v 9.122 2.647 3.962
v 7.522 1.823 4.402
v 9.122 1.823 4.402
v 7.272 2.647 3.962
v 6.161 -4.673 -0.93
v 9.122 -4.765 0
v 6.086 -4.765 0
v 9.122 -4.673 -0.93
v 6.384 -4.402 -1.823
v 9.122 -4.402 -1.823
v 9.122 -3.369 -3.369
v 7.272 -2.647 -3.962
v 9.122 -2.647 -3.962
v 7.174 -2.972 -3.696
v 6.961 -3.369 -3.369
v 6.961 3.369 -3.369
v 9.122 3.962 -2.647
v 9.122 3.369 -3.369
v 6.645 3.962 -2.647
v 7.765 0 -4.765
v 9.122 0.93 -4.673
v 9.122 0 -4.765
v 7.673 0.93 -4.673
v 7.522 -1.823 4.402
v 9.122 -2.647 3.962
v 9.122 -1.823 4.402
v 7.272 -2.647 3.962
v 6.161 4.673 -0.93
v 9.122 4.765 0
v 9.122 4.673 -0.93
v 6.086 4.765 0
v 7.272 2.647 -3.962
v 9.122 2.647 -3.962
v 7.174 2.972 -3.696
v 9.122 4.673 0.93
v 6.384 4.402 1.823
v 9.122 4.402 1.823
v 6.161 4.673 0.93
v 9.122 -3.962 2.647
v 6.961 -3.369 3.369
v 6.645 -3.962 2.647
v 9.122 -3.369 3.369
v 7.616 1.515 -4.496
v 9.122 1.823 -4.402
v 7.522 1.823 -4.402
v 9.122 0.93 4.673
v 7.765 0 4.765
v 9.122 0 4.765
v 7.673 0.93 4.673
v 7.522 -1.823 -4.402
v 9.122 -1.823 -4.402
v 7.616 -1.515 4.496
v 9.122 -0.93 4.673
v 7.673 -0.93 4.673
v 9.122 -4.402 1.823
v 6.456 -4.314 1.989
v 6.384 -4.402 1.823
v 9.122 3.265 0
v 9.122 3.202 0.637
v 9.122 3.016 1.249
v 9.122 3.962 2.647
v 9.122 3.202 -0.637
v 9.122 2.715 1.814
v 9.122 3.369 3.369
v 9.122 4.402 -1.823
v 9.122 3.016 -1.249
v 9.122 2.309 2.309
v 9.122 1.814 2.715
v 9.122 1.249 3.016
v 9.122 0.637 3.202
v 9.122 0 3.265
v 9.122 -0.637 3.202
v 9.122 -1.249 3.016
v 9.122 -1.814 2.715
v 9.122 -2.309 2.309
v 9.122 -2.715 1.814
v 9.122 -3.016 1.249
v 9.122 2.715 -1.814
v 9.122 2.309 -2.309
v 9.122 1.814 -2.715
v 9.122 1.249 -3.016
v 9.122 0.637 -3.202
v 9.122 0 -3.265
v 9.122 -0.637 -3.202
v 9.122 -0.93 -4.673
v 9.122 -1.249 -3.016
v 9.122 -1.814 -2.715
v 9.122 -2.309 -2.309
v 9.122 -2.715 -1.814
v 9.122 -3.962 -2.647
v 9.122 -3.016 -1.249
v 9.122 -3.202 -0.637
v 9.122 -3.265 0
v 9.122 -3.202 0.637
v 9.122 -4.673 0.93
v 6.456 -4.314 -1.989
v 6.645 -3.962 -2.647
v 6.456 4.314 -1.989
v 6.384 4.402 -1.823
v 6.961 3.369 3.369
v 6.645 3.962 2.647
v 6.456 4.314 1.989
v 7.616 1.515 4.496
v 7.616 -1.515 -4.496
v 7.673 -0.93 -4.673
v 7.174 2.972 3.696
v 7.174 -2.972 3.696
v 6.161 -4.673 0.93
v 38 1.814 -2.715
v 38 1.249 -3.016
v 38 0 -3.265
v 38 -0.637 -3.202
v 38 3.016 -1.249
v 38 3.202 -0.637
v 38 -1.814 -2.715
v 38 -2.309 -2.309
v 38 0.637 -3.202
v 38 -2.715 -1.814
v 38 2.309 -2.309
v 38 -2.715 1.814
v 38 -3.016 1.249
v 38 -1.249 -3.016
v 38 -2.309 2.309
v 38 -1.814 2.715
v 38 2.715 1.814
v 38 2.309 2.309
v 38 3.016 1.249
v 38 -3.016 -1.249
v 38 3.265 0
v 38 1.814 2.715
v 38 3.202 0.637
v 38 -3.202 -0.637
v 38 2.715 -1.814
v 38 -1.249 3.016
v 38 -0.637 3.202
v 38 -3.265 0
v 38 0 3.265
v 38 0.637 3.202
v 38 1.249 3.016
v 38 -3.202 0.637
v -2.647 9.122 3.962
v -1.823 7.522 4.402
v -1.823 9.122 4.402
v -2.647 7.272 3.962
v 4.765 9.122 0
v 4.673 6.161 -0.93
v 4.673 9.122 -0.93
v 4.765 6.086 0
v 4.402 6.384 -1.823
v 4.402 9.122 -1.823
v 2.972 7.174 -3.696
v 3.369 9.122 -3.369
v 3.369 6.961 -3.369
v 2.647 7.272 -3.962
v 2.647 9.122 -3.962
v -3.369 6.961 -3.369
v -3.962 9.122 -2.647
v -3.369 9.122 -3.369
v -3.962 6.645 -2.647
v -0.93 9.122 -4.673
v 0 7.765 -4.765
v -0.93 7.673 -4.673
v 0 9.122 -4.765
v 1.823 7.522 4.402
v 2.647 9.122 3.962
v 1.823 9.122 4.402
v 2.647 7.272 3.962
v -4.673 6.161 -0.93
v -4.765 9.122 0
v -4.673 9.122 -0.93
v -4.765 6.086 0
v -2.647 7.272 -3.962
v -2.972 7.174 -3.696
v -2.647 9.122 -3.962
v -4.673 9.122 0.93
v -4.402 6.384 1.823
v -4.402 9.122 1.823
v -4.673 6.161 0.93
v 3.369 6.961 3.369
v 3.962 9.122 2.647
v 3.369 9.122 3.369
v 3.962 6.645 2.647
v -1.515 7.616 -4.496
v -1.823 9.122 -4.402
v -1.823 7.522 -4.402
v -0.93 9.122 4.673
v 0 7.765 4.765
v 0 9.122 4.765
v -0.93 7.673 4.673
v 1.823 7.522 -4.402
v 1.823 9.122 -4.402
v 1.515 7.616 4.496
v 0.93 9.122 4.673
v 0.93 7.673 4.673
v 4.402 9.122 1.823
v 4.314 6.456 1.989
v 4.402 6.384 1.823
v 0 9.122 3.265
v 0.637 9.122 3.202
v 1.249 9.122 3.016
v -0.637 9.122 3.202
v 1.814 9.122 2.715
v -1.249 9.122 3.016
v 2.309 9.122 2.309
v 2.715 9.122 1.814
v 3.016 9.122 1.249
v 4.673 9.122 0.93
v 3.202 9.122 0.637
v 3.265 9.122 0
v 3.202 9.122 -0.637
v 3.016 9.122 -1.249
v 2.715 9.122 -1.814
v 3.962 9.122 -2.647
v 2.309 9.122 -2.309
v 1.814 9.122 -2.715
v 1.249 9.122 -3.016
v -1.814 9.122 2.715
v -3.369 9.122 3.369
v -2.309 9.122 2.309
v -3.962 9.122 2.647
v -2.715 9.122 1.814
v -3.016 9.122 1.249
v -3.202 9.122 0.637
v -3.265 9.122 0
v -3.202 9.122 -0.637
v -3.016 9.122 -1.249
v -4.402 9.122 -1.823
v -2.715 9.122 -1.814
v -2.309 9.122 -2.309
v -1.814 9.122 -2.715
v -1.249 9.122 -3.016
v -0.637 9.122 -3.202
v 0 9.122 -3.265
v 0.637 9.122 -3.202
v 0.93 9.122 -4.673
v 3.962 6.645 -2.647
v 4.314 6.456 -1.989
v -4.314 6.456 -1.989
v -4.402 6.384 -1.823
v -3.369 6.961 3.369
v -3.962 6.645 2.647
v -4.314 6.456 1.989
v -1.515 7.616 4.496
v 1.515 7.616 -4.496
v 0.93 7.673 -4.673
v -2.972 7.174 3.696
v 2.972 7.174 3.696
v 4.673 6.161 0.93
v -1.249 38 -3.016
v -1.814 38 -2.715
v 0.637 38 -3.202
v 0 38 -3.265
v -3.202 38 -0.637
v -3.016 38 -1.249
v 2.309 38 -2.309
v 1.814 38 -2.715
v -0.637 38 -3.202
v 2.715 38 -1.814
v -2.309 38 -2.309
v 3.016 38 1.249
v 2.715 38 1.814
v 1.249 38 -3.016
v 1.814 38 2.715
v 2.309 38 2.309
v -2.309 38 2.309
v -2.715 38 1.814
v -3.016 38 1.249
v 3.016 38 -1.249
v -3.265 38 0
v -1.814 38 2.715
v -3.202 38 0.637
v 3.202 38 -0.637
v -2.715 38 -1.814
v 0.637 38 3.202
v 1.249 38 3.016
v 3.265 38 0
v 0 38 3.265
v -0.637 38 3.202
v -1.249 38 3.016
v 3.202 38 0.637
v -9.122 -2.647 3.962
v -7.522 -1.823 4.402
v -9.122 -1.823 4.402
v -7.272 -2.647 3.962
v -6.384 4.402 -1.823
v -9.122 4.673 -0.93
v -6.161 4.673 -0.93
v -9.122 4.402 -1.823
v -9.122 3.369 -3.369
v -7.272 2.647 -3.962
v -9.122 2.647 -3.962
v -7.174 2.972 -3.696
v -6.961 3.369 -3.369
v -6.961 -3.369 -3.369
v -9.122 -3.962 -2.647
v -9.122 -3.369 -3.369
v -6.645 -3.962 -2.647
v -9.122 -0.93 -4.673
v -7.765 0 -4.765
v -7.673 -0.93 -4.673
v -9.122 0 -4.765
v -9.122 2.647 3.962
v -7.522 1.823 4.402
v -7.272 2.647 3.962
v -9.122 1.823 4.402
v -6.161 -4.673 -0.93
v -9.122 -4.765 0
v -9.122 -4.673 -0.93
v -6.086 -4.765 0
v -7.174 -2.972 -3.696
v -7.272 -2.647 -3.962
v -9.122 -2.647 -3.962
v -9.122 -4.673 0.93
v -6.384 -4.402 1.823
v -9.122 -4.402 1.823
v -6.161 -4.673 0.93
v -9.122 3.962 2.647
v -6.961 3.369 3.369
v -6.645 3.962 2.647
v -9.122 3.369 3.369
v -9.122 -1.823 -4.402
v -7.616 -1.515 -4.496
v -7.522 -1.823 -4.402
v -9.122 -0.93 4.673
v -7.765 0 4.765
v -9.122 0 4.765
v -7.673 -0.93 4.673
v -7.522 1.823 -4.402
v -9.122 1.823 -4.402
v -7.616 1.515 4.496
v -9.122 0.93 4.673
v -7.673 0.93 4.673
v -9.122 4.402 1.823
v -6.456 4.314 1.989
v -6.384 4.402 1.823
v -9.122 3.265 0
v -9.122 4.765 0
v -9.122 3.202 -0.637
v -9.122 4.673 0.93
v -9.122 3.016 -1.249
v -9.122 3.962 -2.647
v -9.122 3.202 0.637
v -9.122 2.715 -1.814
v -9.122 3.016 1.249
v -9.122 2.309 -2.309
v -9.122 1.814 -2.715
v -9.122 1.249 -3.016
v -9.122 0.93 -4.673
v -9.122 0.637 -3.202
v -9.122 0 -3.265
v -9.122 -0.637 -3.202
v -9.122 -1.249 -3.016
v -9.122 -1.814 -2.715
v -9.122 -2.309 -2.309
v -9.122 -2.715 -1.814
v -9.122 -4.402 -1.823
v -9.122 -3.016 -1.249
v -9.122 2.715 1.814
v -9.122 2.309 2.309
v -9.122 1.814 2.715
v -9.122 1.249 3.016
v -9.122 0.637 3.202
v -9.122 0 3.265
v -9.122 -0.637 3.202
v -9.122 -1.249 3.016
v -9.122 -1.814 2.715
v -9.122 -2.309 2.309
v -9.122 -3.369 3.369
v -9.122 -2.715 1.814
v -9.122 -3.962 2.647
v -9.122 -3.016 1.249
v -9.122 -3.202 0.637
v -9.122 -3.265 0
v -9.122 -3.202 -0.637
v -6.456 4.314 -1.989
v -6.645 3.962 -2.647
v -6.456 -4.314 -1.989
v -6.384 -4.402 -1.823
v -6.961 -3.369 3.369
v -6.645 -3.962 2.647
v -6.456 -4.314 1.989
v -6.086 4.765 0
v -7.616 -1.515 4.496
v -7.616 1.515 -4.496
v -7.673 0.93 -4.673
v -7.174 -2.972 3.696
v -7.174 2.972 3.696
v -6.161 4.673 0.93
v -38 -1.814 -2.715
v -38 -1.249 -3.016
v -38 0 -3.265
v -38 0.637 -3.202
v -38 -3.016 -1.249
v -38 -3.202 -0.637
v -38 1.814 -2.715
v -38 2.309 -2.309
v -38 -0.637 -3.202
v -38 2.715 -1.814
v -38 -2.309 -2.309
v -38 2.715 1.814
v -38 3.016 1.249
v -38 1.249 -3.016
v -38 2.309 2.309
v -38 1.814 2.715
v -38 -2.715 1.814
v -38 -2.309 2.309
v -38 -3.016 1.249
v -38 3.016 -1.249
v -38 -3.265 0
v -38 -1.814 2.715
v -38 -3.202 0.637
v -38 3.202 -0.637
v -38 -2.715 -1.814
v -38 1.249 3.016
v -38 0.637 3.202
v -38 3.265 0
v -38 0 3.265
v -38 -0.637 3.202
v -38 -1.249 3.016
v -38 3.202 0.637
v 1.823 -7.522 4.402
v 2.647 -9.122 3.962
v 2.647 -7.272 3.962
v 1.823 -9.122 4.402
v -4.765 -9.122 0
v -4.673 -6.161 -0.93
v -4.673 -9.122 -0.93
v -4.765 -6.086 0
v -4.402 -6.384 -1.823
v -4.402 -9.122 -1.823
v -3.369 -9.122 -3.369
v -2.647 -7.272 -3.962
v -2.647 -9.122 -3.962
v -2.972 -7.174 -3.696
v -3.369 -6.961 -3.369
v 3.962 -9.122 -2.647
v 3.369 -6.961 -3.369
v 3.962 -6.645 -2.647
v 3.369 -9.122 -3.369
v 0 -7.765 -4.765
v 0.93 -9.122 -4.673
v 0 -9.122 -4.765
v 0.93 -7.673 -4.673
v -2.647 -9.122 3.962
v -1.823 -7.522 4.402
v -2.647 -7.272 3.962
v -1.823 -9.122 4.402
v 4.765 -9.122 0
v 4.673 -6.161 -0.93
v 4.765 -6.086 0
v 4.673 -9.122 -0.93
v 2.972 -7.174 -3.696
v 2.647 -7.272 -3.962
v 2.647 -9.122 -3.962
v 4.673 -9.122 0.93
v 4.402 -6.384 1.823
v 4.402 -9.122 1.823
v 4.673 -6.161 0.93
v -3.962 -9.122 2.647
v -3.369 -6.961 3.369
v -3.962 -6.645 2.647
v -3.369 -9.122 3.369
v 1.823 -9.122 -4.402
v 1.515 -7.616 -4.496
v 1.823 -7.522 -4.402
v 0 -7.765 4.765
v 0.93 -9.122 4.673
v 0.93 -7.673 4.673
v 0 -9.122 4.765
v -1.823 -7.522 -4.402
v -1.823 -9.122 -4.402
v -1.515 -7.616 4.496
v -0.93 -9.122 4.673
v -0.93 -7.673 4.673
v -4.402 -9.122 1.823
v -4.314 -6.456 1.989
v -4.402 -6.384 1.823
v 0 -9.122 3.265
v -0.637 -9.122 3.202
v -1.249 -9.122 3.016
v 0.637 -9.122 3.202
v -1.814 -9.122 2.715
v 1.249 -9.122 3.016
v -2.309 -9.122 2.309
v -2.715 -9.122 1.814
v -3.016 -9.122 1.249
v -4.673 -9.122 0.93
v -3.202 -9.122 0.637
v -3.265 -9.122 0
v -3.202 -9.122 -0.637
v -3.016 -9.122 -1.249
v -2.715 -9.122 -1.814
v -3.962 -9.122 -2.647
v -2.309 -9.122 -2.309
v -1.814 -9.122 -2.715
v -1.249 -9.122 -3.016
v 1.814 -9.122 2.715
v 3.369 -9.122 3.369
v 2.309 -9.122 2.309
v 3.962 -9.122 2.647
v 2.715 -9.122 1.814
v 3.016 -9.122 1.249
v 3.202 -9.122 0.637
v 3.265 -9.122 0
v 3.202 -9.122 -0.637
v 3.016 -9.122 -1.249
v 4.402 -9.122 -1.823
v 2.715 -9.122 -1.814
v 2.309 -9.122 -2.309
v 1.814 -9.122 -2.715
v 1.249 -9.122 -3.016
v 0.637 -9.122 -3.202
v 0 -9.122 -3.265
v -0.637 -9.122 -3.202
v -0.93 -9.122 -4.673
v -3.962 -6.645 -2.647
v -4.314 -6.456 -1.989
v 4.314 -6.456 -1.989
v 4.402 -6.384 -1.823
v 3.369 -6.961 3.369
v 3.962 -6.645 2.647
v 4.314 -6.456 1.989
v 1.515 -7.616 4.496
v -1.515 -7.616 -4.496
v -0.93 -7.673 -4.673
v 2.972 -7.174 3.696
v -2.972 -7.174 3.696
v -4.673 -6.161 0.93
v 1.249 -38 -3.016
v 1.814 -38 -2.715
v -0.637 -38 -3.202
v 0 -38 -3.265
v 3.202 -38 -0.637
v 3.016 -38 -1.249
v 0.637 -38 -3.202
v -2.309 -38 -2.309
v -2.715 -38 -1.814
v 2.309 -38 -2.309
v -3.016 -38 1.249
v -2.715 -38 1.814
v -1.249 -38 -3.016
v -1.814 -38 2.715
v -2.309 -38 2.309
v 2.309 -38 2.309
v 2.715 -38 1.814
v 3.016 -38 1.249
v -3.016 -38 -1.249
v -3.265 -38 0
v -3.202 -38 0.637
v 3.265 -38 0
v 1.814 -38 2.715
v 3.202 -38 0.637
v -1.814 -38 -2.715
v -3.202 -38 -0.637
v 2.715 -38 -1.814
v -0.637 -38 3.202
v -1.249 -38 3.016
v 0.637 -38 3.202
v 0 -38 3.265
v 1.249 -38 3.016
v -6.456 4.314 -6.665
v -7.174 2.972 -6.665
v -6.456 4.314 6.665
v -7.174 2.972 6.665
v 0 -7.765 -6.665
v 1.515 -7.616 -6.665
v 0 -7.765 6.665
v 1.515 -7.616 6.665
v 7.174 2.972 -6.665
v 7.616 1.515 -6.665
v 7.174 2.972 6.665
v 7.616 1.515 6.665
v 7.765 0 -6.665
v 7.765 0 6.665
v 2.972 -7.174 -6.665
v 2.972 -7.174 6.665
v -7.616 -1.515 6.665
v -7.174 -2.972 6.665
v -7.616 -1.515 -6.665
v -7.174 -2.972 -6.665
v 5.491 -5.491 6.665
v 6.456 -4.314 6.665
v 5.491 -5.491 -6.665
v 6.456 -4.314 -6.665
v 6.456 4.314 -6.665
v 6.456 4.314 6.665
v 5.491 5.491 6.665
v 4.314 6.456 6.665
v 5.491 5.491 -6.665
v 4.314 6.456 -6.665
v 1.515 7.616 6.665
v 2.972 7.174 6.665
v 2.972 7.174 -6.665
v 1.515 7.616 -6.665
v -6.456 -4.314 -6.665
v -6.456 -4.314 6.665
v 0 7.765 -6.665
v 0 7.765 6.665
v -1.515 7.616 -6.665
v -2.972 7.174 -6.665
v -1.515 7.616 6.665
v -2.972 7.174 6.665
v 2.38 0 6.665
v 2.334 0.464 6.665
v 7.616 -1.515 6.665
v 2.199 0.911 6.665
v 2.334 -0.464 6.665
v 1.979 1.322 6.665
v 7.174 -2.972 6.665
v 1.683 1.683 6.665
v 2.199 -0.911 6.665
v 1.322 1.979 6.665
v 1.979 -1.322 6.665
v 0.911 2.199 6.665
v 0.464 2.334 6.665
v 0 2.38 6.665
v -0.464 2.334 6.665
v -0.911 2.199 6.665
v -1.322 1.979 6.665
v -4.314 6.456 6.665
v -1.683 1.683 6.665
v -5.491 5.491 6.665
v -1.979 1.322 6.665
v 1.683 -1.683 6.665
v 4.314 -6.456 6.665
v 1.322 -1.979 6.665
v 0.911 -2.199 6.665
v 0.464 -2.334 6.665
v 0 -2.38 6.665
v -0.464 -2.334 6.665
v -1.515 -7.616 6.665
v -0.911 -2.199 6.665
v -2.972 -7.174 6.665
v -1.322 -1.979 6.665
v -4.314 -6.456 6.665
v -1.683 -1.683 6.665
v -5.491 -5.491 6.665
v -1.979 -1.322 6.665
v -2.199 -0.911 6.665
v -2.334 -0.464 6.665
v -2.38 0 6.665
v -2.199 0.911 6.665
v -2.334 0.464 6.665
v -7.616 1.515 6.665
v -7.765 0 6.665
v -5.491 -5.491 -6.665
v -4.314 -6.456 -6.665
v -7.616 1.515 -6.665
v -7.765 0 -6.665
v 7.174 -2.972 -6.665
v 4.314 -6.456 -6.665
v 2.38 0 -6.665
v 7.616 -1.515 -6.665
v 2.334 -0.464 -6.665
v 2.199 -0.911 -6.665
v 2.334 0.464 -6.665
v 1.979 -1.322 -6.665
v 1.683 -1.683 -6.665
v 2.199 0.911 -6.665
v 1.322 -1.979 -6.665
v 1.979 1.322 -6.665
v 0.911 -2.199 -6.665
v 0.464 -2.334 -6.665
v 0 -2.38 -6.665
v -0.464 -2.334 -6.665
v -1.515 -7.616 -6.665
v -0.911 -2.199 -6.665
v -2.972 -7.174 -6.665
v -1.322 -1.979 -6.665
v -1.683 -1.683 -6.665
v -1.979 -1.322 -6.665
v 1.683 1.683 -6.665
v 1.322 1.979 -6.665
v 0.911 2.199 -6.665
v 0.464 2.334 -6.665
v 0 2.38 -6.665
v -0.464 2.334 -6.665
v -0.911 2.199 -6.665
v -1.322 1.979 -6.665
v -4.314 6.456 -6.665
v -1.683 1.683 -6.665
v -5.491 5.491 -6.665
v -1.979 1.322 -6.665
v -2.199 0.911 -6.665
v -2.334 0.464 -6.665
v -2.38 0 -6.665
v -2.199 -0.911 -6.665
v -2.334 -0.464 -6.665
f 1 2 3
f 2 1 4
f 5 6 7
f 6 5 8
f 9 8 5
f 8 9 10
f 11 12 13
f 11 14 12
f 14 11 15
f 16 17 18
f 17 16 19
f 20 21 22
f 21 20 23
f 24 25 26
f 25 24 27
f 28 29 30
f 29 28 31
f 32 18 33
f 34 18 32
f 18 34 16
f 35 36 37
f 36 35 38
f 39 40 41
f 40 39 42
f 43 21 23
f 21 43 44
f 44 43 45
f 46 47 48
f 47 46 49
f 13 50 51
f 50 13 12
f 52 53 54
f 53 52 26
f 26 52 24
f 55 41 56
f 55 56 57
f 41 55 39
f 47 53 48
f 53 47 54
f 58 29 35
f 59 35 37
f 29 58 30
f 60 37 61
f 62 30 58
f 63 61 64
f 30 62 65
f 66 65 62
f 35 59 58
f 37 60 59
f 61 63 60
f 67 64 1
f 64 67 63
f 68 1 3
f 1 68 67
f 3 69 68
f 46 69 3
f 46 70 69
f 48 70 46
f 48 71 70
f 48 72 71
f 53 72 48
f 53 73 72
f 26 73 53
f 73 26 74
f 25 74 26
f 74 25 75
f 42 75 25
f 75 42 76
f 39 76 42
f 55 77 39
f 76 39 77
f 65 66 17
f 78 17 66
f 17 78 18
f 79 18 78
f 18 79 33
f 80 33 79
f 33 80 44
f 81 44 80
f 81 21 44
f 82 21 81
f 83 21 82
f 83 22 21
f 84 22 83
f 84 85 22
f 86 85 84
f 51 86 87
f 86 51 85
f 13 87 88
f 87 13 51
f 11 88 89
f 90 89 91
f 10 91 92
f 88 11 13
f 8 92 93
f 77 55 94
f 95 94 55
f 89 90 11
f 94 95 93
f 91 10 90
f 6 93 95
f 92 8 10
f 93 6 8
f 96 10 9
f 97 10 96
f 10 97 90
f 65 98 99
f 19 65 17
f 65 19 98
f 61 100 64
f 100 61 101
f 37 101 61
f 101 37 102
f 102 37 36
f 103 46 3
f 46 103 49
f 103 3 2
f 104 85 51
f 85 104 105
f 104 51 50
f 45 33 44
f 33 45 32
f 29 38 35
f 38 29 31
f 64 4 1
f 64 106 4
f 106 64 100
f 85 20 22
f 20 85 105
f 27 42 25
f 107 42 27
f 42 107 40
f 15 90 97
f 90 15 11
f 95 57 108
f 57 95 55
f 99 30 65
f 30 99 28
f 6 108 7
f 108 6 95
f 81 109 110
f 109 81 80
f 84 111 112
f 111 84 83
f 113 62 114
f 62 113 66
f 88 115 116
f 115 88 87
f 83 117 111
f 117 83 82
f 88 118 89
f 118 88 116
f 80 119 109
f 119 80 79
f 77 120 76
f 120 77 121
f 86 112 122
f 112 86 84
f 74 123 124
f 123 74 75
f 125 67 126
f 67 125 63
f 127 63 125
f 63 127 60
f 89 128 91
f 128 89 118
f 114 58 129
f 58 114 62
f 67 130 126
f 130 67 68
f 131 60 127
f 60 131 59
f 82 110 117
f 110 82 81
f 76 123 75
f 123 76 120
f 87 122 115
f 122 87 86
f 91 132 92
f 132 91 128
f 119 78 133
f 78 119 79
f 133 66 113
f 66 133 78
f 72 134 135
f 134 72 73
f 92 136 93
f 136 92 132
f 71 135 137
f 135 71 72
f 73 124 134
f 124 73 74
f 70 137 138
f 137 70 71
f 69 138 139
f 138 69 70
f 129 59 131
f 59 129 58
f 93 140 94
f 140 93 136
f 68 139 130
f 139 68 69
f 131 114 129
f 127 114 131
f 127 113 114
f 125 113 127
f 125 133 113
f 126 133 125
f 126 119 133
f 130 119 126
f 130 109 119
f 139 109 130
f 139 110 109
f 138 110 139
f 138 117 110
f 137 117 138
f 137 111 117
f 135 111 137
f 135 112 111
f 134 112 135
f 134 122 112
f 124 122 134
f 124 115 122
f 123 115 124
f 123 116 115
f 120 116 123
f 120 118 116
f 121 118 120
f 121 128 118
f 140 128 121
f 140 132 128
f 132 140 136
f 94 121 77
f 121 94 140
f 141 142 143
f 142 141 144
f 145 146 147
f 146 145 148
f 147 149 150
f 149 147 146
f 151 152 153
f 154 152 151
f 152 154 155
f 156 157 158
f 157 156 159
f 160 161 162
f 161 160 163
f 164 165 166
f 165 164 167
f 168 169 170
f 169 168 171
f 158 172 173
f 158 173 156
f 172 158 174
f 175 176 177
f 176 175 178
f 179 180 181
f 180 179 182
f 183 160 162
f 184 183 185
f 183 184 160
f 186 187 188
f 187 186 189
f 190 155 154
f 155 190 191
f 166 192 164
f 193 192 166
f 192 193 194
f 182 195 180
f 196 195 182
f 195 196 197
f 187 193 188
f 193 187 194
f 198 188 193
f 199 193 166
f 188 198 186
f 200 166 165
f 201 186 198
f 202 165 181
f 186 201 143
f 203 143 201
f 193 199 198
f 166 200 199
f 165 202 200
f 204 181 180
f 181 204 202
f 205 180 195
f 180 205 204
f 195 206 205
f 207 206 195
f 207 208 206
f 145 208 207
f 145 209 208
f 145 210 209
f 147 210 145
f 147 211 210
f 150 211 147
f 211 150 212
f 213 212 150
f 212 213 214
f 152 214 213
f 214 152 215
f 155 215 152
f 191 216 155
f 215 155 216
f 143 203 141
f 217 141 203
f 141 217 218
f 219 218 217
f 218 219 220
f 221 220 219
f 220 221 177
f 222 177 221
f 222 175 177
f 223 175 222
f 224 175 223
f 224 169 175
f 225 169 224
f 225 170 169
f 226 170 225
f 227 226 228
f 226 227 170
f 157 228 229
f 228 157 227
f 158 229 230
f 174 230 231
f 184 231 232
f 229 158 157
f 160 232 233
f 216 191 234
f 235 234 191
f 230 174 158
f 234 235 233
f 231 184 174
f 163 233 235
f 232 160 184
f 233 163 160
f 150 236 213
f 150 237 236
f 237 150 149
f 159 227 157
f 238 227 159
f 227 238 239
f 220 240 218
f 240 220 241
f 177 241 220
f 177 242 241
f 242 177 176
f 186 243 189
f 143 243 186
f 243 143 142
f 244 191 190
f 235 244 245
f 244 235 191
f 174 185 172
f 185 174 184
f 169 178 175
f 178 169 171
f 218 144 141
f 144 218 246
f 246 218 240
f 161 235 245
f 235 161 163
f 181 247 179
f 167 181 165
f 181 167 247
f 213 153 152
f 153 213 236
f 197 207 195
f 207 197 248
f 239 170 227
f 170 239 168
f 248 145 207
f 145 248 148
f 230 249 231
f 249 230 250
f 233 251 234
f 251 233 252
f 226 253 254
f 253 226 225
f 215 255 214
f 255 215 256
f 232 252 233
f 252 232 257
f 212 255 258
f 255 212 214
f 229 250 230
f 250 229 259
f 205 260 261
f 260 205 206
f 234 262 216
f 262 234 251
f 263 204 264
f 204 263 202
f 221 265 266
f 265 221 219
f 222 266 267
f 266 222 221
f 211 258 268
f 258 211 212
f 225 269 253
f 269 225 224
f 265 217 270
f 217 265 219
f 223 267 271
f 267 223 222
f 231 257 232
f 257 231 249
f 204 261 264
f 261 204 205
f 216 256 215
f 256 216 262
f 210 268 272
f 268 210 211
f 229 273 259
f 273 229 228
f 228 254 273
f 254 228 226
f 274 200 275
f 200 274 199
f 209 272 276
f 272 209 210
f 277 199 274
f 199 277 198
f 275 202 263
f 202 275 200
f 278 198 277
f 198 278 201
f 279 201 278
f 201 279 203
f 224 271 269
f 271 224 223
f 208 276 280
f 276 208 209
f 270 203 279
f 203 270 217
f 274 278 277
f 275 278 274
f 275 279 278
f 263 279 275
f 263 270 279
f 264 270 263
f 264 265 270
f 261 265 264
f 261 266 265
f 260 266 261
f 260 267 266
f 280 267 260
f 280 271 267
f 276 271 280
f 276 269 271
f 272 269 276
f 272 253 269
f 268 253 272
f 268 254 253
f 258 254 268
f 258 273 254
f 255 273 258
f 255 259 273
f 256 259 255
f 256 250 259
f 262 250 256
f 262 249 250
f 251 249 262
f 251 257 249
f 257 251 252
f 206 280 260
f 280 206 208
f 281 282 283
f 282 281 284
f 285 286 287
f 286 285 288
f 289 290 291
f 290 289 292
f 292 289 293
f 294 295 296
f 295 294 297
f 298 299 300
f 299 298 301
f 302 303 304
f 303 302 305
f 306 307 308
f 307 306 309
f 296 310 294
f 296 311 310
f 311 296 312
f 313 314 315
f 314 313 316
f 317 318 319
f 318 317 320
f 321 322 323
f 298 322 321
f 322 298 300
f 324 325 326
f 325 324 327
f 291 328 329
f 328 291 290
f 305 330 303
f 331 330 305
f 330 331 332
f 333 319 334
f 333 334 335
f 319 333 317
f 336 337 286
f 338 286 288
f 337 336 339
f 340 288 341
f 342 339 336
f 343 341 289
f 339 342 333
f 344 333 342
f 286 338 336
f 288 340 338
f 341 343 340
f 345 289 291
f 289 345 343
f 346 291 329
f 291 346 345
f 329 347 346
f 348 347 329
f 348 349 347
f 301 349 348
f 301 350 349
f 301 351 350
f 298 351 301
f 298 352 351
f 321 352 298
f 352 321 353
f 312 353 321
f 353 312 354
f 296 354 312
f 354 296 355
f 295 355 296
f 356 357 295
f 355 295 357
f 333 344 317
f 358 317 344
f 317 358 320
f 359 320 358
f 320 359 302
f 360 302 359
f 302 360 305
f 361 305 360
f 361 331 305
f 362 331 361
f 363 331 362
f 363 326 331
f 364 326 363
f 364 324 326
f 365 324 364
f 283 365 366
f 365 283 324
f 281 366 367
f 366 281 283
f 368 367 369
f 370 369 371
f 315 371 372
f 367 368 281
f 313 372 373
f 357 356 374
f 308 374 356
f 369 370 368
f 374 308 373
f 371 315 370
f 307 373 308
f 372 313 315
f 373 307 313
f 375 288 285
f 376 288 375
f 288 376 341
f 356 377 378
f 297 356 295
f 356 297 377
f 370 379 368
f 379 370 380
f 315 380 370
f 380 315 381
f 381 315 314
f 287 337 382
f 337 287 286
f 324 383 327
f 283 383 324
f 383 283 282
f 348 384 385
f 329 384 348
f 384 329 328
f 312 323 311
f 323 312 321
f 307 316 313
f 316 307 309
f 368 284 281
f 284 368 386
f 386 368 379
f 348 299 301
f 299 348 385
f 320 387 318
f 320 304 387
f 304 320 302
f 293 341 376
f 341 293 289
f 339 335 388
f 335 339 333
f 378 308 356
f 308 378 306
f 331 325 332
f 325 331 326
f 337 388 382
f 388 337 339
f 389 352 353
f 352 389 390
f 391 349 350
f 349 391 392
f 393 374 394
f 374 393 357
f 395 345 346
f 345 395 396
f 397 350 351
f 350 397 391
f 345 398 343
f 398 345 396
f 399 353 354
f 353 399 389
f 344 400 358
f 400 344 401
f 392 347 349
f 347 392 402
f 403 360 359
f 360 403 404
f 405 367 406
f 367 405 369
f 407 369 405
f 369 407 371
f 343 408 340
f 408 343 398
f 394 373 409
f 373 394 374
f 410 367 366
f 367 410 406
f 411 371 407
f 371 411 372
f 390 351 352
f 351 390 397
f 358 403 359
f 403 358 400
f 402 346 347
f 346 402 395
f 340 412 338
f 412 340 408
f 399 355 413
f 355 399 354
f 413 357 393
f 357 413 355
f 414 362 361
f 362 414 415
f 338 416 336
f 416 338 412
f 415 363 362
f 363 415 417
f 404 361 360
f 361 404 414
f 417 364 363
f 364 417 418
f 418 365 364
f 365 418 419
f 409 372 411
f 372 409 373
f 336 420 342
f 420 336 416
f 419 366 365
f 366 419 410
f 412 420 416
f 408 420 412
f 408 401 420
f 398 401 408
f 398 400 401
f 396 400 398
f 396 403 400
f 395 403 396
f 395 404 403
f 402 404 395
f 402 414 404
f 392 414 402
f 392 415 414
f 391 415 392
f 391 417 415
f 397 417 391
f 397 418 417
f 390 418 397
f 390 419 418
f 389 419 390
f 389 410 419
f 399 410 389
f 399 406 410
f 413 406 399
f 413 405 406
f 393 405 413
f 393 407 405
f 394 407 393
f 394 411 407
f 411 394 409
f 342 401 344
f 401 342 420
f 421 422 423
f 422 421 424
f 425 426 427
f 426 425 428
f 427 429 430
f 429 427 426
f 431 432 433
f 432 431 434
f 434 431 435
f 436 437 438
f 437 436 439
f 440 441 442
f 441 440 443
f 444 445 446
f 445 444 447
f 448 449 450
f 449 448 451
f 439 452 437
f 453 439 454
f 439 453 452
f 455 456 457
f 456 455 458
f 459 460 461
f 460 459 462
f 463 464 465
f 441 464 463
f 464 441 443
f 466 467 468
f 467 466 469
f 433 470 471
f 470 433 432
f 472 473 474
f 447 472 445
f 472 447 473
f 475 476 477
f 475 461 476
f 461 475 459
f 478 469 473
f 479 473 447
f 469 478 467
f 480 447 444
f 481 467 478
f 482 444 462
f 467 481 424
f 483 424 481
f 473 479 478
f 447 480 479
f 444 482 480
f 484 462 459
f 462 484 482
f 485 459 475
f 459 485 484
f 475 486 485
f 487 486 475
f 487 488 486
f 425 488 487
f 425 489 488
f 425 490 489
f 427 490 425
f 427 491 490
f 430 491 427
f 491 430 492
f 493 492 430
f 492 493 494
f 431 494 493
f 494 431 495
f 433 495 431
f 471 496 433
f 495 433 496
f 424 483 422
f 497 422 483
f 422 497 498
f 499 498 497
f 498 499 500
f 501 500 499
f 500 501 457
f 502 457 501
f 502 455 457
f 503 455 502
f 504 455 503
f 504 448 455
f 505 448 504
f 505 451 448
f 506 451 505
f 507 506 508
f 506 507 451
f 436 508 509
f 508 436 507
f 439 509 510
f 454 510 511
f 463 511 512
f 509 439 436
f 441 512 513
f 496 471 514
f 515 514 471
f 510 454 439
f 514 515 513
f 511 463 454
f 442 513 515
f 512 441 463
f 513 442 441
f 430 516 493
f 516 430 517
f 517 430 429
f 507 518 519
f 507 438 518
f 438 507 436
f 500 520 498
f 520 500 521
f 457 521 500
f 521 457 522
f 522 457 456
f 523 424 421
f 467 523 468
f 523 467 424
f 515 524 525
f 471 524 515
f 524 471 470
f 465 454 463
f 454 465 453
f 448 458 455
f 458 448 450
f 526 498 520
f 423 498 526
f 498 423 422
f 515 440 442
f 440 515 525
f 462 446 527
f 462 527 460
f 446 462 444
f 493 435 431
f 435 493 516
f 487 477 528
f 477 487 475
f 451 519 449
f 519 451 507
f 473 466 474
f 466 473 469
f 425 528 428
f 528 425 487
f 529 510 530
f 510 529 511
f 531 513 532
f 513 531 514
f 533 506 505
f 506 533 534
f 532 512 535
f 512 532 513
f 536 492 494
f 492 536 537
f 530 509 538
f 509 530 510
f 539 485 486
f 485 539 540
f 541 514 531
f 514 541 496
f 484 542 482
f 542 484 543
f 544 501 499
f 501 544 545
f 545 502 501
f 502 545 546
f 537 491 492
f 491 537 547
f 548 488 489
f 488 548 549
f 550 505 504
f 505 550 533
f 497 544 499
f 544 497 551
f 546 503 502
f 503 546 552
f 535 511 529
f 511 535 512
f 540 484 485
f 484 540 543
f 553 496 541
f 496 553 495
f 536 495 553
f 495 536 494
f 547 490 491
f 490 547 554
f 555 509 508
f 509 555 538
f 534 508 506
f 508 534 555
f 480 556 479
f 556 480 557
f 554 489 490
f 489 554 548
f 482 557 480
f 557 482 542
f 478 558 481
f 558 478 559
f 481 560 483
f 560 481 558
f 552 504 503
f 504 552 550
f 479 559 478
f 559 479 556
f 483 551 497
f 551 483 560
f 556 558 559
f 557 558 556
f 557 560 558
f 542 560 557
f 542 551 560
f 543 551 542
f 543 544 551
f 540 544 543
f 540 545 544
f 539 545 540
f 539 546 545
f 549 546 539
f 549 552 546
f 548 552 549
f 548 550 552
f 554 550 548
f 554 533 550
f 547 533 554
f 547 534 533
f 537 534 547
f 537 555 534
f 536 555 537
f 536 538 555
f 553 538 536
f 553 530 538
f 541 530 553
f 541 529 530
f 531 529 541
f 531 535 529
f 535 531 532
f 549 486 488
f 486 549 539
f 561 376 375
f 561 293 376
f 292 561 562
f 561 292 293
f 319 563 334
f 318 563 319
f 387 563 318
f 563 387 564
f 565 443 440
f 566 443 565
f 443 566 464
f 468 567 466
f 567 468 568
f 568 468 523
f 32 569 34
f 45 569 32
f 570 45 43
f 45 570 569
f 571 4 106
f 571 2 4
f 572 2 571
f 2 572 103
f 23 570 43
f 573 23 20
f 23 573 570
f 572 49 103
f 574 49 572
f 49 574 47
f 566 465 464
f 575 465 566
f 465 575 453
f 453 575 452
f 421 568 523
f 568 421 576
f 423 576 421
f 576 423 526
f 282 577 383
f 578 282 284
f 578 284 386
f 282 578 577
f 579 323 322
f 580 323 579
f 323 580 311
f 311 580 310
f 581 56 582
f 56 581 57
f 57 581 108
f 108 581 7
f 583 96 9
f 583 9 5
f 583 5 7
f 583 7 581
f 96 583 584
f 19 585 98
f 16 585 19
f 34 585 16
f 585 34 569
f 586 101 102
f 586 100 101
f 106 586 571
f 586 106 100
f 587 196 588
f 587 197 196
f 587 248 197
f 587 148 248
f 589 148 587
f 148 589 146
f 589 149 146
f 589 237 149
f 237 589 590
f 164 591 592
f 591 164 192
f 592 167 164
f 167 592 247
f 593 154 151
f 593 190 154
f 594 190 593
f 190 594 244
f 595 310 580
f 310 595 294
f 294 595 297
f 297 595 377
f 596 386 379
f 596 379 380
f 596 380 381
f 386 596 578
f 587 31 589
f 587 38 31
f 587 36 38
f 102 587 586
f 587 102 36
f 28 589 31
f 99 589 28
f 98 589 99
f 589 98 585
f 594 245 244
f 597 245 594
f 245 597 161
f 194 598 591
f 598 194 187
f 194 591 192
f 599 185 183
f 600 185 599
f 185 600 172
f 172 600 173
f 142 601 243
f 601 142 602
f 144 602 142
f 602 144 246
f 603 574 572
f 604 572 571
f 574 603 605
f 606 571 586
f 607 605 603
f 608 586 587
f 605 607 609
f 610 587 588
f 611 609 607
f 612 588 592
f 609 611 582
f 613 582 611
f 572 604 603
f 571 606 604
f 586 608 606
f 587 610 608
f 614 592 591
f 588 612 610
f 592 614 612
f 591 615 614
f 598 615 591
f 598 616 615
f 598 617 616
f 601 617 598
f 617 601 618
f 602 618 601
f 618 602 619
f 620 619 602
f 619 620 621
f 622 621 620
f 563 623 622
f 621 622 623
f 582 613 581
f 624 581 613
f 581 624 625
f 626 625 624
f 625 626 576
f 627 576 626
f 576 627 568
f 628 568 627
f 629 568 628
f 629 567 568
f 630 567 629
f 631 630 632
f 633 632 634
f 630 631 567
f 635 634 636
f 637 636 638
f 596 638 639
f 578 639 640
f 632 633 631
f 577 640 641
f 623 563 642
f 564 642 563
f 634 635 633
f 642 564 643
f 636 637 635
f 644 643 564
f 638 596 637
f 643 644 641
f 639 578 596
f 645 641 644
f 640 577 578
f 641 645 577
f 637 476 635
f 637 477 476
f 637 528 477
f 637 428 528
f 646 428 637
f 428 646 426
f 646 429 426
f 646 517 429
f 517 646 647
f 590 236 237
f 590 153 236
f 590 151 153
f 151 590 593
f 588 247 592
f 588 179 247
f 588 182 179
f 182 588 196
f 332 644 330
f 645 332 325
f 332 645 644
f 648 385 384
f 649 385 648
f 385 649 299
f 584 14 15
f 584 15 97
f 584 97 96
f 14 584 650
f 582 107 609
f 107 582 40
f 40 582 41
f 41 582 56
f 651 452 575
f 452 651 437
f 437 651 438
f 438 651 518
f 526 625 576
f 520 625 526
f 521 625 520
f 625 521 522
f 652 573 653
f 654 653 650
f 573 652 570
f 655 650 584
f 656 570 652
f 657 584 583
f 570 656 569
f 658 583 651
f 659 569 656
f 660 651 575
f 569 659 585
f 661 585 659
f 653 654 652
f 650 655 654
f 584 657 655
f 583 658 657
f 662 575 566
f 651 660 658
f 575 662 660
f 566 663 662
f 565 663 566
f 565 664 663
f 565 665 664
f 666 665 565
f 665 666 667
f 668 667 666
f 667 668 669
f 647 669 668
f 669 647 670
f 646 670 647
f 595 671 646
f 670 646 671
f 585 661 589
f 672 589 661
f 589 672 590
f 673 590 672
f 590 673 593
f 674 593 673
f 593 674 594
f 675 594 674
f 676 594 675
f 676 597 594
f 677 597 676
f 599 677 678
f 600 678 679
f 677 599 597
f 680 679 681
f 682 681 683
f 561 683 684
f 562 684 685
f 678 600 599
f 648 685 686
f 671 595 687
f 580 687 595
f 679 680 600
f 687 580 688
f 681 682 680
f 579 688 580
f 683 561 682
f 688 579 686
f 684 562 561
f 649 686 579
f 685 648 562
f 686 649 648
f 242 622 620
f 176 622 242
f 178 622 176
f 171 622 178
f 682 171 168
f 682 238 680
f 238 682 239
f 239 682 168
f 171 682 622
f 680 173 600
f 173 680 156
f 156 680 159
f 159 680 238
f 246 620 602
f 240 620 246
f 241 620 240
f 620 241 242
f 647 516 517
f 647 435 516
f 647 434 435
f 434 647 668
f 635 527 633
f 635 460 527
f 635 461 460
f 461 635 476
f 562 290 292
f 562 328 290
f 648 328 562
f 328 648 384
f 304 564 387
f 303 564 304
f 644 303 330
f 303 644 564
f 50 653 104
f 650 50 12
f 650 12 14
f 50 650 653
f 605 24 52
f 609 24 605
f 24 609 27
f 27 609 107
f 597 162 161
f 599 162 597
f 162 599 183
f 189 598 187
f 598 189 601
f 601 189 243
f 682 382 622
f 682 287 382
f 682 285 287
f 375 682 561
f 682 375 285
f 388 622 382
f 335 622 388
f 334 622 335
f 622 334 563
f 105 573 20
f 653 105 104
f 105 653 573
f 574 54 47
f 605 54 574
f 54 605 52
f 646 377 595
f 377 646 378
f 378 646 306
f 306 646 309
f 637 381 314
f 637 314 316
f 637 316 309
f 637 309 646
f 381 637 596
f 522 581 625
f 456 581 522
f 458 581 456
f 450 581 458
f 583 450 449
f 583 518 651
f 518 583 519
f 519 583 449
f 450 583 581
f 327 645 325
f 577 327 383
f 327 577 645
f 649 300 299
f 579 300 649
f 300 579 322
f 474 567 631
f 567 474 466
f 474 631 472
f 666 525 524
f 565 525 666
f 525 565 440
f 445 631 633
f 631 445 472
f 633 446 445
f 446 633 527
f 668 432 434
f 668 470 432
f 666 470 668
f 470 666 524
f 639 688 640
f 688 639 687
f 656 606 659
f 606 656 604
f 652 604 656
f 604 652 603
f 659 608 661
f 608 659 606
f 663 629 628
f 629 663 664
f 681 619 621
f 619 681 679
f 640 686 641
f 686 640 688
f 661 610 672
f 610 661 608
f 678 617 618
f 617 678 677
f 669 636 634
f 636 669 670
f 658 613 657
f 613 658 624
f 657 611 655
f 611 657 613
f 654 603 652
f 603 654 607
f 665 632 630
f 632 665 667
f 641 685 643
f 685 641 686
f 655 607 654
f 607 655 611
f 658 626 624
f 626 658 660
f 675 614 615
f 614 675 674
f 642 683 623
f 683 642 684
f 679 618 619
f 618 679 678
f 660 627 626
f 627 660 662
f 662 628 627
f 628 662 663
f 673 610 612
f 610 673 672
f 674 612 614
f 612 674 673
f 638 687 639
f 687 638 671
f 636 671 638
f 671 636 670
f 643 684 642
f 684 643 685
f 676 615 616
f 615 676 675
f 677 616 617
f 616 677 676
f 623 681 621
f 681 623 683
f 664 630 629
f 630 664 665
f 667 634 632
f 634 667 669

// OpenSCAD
$fn = 32;

// ----------------------------------------------------------------------
// Cardan cross: 76 mm span, 9.53 mm trunnions
// ----------------------------------------------------------------------

// --- parameters (mm) ---
journal_d = 9.53;         // trunnion diameter
arm_len = 38;             // trunnion length from the centre
step_r = 3.24;            // step position from the centre
step_d = 6.53;            // journal diameter after the step
hub_d = 15.53;            // hub diameter
hub_h = 13.33;            // hub height
bore_d = 4.76;            // hub bore

difference() {
  union() {
    /* hub along the joint axis */
    cylinder(h = hub_h, d = hub_d, center = true);
    for (a = [0 : 90 : 270]) rotate([0, 0, a]) {
      /* trunnion, sunk into the hub */
      translate([hub_d / 4, 0, 0]) rotate([0, 90, 0]) cylinder(h = step_r + 2, d = journal_d);
      /* stepped journal out to the tip */
      translate([step_r - 0.5, 0, 0]) rotate([0, 90, 0]) cylinder(h = arm_len + 0.5 - step_r, d = step_d);
    }
  }
  /* lubrication bore through the hub, 2.5 mm clear on both sides */
  translate([0, 0, -hub_h / 2 - 2.5]) cylinder(h = hub_h + 5, d = bore_d);
}
